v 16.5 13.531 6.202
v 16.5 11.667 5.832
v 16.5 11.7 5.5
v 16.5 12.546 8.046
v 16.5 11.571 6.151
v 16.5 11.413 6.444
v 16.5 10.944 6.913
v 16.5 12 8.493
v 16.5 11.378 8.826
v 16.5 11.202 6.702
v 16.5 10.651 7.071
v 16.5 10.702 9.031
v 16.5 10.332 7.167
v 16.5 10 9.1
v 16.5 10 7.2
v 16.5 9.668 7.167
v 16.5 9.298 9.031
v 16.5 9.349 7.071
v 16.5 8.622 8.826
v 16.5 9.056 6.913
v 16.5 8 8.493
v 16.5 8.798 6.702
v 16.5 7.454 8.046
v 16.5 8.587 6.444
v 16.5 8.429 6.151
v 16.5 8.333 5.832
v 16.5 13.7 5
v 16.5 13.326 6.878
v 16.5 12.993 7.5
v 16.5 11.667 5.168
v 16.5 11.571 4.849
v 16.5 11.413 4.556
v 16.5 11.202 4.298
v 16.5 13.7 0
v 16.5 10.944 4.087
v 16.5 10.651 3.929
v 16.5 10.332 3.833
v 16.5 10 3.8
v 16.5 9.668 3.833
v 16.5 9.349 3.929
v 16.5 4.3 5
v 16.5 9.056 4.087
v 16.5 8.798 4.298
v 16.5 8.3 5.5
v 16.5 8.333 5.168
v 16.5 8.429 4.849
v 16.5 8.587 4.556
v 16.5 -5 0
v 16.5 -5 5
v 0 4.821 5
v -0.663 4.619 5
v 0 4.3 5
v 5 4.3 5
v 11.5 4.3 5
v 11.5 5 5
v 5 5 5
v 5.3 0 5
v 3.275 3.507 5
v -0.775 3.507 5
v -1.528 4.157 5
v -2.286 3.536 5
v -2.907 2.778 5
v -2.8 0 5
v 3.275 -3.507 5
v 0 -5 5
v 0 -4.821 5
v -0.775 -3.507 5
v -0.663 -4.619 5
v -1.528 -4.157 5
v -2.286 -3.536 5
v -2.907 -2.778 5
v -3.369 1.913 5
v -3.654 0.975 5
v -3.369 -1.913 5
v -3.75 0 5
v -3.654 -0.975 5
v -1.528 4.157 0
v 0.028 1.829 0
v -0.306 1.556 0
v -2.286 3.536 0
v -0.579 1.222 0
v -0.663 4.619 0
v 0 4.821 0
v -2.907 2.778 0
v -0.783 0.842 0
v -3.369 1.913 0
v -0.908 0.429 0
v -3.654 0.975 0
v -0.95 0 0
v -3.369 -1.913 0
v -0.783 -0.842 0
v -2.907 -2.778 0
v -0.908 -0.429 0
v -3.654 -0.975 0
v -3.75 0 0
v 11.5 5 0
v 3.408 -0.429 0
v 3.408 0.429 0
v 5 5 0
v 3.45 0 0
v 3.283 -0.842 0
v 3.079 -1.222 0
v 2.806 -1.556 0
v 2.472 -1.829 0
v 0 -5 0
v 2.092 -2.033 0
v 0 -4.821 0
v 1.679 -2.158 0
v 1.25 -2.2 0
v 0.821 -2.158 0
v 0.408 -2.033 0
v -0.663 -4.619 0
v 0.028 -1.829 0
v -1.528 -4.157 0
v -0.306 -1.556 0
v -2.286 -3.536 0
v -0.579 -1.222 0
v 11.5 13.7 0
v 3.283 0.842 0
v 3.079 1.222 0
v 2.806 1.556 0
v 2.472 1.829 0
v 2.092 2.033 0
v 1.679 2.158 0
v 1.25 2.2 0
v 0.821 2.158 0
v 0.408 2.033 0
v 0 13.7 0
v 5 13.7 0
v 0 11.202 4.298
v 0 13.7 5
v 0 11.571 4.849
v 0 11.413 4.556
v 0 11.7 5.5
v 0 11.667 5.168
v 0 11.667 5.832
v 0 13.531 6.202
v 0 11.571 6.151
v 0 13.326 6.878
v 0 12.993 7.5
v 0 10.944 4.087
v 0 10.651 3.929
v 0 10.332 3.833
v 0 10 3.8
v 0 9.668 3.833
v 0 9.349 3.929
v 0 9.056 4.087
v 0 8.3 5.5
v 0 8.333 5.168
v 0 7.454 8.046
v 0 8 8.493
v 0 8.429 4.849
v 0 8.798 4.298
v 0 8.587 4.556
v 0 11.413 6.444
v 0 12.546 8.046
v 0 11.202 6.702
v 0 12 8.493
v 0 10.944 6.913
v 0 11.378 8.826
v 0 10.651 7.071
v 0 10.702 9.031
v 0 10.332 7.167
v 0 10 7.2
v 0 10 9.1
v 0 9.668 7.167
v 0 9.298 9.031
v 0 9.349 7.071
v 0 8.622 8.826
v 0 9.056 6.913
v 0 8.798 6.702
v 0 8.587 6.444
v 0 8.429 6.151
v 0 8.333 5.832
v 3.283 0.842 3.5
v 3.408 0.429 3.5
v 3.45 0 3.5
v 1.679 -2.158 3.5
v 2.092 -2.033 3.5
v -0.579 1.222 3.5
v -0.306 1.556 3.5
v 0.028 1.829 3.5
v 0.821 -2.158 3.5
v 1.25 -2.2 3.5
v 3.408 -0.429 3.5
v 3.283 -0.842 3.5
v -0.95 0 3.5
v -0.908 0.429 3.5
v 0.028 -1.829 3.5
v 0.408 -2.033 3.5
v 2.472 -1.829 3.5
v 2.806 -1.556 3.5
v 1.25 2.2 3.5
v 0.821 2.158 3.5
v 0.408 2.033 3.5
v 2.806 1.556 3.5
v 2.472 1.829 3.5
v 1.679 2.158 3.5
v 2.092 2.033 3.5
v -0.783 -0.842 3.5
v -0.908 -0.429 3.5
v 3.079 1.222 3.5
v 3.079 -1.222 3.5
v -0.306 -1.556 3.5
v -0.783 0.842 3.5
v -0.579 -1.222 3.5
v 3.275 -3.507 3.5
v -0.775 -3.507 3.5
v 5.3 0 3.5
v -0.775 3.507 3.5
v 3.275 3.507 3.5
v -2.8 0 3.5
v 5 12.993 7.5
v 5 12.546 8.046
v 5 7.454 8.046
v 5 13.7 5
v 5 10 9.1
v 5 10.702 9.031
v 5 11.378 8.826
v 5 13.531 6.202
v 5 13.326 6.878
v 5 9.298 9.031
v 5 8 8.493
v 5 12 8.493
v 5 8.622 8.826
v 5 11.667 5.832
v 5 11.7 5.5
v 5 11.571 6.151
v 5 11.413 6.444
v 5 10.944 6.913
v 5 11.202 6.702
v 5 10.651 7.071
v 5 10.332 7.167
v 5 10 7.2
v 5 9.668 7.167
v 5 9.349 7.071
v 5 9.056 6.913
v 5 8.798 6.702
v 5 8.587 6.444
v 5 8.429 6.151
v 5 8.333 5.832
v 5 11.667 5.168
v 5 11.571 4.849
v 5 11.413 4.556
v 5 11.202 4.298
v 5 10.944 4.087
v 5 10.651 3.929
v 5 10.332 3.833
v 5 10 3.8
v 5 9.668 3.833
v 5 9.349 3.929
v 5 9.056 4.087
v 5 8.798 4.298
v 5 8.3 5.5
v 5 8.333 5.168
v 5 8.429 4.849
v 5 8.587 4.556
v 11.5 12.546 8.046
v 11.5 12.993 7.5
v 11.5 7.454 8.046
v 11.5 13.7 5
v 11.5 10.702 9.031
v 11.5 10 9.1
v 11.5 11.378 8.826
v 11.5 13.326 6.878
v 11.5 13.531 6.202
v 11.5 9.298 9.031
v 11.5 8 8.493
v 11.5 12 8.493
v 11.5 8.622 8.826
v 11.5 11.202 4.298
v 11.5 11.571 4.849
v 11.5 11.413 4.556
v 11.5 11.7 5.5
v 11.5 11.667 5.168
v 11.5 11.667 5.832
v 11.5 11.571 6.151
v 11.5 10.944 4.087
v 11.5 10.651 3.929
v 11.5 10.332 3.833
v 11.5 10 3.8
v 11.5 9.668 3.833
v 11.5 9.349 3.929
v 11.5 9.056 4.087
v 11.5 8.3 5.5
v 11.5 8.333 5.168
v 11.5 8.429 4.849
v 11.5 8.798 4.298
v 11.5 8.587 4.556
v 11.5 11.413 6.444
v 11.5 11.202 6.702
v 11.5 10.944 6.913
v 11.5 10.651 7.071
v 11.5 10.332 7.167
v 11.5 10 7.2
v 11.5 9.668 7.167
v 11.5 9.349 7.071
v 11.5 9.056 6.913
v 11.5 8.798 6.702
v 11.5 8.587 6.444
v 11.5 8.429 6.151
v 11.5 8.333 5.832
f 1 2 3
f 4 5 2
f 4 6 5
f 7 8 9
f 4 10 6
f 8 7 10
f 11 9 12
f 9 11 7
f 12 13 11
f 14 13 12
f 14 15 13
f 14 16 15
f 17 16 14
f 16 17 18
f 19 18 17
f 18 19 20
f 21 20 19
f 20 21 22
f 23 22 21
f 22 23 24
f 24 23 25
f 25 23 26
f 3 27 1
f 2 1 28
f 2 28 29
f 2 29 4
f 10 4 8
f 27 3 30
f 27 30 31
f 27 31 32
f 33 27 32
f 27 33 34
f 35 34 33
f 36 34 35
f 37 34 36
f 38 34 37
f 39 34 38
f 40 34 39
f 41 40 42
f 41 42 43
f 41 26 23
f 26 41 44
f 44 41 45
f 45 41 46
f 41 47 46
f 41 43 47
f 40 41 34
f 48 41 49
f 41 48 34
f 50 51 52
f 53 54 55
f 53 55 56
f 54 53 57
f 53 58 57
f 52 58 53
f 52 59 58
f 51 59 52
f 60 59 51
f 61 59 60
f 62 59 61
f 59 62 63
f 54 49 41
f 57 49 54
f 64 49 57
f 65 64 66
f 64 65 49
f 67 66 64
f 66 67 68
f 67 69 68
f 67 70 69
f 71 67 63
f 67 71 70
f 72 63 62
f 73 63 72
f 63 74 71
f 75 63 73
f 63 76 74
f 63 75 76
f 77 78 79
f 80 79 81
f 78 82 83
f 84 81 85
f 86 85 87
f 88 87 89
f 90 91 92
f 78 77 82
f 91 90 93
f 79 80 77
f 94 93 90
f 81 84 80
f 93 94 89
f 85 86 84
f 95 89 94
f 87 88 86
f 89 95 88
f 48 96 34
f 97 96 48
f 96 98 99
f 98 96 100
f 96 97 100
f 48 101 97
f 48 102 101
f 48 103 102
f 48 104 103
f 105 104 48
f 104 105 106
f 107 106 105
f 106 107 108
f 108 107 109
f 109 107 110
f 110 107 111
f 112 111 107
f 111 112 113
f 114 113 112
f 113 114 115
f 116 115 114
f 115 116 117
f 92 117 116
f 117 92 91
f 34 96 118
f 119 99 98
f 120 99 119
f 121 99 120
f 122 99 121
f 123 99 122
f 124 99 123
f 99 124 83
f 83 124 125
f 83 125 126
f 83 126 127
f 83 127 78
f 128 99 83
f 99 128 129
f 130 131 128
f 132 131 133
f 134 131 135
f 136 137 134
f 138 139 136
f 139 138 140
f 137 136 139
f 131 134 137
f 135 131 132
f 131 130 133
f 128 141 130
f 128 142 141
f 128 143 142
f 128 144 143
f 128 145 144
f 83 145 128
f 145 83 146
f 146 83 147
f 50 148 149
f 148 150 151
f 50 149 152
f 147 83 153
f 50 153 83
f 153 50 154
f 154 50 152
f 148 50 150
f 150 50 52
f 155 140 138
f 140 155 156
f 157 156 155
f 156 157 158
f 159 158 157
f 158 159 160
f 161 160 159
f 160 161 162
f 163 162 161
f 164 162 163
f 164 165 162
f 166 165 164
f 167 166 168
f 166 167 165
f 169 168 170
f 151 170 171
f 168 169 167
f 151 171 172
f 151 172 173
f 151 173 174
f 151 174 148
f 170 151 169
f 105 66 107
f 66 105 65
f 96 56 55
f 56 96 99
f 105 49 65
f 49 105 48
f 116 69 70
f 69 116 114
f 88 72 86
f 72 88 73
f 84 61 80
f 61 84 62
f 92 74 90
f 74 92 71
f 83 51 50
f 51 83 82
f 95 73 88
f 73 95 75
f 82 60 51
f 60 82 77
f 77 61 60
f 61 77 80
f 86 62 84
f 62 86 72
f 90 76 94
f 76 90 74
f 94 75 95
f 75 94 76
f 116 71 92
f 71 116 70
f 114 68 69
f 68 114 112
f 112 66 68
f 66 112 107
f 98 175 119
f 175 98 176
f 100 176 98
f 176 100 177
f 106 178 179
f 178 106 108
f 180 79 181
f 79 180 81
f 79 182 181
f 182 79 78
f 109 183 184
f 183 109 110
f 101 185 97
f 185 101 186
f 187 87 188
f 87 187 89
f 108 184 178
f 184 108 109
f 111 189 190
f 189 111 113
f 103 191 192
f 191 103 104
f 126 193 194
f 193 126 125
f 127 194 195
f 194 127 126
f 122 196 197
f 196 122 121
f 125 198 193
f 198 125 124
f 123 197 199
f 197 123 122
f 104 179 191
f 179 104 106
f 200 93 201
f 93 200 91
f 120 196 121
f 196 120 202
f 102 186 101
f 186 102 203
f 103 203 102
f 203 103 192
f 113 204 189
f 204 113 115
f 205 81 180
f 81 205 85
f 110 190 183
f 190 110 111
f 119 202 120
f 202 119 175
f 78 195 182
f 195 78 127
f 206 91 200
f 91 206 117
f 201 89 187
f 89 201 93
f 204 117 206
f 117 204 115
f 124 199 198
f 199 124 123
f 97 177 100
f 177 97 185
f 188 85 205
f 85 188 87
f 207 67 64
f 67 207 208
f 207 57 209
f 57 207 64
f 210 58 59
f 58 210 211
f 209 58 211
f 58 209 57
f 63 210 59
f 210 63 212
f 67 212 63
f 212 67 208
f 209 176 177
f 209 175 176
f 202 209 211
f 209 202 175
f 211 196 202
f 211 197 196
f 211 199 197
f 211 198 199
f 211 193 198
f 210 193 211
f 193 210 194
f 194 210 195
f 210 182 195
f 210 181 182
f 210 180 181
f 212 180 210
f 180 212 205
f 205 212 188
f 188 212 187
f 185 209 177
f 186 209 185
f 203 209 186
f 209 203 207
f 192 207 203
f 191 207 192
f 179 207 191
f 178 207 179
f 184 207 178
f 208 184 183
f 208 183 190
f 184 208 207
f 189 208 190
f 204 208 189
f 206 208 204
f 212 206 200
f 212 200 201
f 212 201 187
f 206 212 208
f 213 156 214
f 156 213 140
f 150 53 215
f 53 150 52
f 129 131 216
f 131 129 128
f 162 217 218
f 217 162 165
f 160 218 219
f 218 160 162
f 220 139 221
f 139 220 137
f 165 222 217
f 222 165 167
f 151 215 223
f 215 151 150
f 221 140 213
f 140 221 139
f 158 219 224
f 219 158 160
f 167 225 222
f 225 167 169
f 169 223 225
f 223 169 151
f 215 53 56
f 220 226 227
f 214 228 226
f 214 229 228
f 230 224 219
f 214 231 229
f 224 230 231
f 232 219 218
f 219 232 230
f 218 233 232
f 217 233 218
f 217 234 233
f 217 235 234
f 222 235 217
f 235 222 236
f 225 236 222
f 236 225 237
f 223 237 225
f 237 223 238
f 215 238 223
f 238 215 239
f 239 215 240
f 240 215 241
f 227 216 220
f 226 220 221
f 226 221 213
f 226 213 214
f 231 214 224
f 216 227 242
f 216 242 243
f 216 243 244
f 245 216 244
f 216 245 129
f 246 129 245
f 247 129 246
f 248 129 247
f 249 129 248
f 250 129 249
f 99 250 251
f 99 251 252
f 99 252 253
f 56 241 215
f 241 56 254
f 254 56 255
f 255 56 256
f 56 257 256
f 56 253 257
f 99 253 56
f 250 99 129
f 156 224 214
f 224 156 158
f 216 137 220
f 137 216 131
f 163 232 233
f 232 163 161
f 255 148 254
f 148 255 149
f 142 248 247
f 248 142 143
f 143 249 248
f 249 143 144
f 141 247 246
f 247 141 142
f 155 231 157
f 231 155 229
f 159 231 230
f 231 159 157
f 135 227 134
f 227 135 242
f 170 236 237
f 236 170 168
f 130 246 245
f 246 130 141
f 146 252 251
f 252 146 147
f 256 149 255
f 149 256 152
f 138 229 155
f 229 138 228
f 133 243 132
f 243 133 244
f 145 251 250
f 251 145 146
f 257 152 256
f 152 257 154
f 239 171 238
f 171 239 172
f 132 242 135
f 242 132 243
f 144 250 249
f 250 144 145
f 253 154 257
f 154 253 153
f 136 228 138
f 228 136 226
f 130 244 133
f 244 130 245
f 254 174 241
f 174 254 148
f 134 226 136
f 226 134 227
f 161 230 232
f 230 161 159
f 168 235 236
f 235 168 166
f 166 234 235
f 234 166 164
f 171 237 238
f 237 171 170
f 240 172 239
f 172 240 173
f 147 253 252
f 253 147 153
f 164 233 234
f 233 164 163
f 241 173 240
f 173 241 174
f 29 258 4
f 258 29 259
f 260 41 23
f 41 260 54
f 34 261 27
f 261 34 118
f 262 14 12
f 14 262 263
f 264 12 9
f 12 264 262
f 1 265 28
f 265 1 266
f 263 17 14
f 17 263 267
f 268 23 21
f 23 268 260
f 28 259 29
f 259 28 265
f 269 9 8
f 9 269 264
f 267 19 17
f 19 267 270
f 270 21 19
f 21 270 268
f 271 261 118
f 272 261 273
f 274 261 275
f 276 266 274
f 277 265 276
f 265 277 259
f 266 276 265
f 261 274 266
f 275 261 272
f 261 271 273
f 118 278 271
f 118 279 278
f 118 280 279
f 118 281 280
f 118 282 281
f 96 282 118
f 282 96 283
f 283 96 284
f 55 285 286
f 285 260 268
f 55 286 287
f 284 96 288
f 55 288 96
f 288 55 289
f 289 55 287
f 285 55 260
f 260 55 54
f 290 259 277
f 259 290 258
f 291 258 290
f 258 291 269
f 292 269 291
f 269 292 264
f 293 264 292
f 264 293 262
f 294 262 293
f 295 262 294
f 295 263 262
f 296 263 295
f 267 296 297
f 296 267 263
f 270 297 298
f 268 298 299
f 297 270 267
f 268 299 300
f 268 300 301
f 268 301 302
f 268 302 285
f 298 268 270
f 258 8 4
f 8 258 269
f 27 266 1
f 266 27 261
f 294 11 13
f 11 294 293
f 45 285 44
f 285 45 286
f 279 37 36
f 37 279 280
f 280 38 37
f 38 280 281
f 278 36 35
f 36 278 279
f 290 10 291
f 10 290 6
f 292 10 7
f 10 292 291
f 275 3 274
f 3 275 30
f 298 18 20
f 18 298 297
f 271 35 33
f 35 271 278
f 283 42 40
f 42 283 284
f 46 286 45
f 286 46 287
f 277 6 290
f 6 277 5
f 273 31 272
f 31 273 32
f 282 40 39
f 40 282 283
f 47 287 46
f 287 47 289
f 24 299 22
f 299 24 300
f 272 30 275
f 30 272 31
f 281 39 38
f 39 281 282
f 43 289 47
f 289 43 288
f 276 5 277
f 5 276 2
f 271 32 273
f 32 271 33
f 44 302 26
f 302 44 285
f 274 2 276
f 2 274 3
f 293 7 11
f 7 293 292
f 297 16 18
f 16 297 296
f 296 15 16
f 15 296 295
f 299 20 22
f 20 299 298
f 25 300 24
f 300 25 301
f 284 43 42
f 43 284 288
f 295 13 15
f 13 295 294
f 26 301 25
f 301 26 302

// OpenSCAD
//-- Direct Drive Layer Fan Mount
//-- by AndrewBCN - Barcelona, Spain - November 2014
//-- GPLV3
//-- adds a layer fan to the Direct Drive Extruder
//-- by Marty Rice (Thingiverse #501755)

//-- this small piece is used to attach a blower fan
//-- to the direct drive extruder body

//-- also requires the layer fan duct

//-- the fan type used is the 5015S 12V centrifugal fan
//-- a.k.a 5015S blower fan
//-- (commonly available for around $2)

$fn=32;

pth=5; // plate thickness
pwi=16.5; // plate width

hth=5; // hinge cyls thickness

// plate

difference() {
  translate([pwi/2,0,pth/2]) {
    cube([pwi,10,pth], center=true);
    translate([-7,0,0]) cylinder(r=5, h=5, center=true);
  }
  // blower fan mount hole and nut trap, M4
  translate([pwi/2-7,0,pth/2]) cylinder(r=4.4/2, h=10, center=true);
  translate([pwi/2-7,0,pth]) cylinder(r=8.1/2, h=3, center=true, $fn=6);
}

// attach to extruder body
translate([hth/2,0,3]) {
  translate([0,10,pth/2]) rotate([0,90,0]) difference() {
    hull() {
      cylinder(r=7.2/2,h=hth, center=true);
      translate([3,-1,0]) cube([pth,2.2+7.2,hth], center=true);
    }
    cylinder(r=1.7,h=6, center=true); // M3 screw hole
  }

  translate([6.5+5,10,pth/2]) rotate([0,90,0]) difference() {
    hull() {
      cylinder(r=7.2/2,h=hth, center=true);
      translate([3,-1,0]) cube([pth,2.2+7.2,hth], center=true);
    }
    cylinder(r=1.7,h=6, center=true); // M3 screw hole
  }
}
